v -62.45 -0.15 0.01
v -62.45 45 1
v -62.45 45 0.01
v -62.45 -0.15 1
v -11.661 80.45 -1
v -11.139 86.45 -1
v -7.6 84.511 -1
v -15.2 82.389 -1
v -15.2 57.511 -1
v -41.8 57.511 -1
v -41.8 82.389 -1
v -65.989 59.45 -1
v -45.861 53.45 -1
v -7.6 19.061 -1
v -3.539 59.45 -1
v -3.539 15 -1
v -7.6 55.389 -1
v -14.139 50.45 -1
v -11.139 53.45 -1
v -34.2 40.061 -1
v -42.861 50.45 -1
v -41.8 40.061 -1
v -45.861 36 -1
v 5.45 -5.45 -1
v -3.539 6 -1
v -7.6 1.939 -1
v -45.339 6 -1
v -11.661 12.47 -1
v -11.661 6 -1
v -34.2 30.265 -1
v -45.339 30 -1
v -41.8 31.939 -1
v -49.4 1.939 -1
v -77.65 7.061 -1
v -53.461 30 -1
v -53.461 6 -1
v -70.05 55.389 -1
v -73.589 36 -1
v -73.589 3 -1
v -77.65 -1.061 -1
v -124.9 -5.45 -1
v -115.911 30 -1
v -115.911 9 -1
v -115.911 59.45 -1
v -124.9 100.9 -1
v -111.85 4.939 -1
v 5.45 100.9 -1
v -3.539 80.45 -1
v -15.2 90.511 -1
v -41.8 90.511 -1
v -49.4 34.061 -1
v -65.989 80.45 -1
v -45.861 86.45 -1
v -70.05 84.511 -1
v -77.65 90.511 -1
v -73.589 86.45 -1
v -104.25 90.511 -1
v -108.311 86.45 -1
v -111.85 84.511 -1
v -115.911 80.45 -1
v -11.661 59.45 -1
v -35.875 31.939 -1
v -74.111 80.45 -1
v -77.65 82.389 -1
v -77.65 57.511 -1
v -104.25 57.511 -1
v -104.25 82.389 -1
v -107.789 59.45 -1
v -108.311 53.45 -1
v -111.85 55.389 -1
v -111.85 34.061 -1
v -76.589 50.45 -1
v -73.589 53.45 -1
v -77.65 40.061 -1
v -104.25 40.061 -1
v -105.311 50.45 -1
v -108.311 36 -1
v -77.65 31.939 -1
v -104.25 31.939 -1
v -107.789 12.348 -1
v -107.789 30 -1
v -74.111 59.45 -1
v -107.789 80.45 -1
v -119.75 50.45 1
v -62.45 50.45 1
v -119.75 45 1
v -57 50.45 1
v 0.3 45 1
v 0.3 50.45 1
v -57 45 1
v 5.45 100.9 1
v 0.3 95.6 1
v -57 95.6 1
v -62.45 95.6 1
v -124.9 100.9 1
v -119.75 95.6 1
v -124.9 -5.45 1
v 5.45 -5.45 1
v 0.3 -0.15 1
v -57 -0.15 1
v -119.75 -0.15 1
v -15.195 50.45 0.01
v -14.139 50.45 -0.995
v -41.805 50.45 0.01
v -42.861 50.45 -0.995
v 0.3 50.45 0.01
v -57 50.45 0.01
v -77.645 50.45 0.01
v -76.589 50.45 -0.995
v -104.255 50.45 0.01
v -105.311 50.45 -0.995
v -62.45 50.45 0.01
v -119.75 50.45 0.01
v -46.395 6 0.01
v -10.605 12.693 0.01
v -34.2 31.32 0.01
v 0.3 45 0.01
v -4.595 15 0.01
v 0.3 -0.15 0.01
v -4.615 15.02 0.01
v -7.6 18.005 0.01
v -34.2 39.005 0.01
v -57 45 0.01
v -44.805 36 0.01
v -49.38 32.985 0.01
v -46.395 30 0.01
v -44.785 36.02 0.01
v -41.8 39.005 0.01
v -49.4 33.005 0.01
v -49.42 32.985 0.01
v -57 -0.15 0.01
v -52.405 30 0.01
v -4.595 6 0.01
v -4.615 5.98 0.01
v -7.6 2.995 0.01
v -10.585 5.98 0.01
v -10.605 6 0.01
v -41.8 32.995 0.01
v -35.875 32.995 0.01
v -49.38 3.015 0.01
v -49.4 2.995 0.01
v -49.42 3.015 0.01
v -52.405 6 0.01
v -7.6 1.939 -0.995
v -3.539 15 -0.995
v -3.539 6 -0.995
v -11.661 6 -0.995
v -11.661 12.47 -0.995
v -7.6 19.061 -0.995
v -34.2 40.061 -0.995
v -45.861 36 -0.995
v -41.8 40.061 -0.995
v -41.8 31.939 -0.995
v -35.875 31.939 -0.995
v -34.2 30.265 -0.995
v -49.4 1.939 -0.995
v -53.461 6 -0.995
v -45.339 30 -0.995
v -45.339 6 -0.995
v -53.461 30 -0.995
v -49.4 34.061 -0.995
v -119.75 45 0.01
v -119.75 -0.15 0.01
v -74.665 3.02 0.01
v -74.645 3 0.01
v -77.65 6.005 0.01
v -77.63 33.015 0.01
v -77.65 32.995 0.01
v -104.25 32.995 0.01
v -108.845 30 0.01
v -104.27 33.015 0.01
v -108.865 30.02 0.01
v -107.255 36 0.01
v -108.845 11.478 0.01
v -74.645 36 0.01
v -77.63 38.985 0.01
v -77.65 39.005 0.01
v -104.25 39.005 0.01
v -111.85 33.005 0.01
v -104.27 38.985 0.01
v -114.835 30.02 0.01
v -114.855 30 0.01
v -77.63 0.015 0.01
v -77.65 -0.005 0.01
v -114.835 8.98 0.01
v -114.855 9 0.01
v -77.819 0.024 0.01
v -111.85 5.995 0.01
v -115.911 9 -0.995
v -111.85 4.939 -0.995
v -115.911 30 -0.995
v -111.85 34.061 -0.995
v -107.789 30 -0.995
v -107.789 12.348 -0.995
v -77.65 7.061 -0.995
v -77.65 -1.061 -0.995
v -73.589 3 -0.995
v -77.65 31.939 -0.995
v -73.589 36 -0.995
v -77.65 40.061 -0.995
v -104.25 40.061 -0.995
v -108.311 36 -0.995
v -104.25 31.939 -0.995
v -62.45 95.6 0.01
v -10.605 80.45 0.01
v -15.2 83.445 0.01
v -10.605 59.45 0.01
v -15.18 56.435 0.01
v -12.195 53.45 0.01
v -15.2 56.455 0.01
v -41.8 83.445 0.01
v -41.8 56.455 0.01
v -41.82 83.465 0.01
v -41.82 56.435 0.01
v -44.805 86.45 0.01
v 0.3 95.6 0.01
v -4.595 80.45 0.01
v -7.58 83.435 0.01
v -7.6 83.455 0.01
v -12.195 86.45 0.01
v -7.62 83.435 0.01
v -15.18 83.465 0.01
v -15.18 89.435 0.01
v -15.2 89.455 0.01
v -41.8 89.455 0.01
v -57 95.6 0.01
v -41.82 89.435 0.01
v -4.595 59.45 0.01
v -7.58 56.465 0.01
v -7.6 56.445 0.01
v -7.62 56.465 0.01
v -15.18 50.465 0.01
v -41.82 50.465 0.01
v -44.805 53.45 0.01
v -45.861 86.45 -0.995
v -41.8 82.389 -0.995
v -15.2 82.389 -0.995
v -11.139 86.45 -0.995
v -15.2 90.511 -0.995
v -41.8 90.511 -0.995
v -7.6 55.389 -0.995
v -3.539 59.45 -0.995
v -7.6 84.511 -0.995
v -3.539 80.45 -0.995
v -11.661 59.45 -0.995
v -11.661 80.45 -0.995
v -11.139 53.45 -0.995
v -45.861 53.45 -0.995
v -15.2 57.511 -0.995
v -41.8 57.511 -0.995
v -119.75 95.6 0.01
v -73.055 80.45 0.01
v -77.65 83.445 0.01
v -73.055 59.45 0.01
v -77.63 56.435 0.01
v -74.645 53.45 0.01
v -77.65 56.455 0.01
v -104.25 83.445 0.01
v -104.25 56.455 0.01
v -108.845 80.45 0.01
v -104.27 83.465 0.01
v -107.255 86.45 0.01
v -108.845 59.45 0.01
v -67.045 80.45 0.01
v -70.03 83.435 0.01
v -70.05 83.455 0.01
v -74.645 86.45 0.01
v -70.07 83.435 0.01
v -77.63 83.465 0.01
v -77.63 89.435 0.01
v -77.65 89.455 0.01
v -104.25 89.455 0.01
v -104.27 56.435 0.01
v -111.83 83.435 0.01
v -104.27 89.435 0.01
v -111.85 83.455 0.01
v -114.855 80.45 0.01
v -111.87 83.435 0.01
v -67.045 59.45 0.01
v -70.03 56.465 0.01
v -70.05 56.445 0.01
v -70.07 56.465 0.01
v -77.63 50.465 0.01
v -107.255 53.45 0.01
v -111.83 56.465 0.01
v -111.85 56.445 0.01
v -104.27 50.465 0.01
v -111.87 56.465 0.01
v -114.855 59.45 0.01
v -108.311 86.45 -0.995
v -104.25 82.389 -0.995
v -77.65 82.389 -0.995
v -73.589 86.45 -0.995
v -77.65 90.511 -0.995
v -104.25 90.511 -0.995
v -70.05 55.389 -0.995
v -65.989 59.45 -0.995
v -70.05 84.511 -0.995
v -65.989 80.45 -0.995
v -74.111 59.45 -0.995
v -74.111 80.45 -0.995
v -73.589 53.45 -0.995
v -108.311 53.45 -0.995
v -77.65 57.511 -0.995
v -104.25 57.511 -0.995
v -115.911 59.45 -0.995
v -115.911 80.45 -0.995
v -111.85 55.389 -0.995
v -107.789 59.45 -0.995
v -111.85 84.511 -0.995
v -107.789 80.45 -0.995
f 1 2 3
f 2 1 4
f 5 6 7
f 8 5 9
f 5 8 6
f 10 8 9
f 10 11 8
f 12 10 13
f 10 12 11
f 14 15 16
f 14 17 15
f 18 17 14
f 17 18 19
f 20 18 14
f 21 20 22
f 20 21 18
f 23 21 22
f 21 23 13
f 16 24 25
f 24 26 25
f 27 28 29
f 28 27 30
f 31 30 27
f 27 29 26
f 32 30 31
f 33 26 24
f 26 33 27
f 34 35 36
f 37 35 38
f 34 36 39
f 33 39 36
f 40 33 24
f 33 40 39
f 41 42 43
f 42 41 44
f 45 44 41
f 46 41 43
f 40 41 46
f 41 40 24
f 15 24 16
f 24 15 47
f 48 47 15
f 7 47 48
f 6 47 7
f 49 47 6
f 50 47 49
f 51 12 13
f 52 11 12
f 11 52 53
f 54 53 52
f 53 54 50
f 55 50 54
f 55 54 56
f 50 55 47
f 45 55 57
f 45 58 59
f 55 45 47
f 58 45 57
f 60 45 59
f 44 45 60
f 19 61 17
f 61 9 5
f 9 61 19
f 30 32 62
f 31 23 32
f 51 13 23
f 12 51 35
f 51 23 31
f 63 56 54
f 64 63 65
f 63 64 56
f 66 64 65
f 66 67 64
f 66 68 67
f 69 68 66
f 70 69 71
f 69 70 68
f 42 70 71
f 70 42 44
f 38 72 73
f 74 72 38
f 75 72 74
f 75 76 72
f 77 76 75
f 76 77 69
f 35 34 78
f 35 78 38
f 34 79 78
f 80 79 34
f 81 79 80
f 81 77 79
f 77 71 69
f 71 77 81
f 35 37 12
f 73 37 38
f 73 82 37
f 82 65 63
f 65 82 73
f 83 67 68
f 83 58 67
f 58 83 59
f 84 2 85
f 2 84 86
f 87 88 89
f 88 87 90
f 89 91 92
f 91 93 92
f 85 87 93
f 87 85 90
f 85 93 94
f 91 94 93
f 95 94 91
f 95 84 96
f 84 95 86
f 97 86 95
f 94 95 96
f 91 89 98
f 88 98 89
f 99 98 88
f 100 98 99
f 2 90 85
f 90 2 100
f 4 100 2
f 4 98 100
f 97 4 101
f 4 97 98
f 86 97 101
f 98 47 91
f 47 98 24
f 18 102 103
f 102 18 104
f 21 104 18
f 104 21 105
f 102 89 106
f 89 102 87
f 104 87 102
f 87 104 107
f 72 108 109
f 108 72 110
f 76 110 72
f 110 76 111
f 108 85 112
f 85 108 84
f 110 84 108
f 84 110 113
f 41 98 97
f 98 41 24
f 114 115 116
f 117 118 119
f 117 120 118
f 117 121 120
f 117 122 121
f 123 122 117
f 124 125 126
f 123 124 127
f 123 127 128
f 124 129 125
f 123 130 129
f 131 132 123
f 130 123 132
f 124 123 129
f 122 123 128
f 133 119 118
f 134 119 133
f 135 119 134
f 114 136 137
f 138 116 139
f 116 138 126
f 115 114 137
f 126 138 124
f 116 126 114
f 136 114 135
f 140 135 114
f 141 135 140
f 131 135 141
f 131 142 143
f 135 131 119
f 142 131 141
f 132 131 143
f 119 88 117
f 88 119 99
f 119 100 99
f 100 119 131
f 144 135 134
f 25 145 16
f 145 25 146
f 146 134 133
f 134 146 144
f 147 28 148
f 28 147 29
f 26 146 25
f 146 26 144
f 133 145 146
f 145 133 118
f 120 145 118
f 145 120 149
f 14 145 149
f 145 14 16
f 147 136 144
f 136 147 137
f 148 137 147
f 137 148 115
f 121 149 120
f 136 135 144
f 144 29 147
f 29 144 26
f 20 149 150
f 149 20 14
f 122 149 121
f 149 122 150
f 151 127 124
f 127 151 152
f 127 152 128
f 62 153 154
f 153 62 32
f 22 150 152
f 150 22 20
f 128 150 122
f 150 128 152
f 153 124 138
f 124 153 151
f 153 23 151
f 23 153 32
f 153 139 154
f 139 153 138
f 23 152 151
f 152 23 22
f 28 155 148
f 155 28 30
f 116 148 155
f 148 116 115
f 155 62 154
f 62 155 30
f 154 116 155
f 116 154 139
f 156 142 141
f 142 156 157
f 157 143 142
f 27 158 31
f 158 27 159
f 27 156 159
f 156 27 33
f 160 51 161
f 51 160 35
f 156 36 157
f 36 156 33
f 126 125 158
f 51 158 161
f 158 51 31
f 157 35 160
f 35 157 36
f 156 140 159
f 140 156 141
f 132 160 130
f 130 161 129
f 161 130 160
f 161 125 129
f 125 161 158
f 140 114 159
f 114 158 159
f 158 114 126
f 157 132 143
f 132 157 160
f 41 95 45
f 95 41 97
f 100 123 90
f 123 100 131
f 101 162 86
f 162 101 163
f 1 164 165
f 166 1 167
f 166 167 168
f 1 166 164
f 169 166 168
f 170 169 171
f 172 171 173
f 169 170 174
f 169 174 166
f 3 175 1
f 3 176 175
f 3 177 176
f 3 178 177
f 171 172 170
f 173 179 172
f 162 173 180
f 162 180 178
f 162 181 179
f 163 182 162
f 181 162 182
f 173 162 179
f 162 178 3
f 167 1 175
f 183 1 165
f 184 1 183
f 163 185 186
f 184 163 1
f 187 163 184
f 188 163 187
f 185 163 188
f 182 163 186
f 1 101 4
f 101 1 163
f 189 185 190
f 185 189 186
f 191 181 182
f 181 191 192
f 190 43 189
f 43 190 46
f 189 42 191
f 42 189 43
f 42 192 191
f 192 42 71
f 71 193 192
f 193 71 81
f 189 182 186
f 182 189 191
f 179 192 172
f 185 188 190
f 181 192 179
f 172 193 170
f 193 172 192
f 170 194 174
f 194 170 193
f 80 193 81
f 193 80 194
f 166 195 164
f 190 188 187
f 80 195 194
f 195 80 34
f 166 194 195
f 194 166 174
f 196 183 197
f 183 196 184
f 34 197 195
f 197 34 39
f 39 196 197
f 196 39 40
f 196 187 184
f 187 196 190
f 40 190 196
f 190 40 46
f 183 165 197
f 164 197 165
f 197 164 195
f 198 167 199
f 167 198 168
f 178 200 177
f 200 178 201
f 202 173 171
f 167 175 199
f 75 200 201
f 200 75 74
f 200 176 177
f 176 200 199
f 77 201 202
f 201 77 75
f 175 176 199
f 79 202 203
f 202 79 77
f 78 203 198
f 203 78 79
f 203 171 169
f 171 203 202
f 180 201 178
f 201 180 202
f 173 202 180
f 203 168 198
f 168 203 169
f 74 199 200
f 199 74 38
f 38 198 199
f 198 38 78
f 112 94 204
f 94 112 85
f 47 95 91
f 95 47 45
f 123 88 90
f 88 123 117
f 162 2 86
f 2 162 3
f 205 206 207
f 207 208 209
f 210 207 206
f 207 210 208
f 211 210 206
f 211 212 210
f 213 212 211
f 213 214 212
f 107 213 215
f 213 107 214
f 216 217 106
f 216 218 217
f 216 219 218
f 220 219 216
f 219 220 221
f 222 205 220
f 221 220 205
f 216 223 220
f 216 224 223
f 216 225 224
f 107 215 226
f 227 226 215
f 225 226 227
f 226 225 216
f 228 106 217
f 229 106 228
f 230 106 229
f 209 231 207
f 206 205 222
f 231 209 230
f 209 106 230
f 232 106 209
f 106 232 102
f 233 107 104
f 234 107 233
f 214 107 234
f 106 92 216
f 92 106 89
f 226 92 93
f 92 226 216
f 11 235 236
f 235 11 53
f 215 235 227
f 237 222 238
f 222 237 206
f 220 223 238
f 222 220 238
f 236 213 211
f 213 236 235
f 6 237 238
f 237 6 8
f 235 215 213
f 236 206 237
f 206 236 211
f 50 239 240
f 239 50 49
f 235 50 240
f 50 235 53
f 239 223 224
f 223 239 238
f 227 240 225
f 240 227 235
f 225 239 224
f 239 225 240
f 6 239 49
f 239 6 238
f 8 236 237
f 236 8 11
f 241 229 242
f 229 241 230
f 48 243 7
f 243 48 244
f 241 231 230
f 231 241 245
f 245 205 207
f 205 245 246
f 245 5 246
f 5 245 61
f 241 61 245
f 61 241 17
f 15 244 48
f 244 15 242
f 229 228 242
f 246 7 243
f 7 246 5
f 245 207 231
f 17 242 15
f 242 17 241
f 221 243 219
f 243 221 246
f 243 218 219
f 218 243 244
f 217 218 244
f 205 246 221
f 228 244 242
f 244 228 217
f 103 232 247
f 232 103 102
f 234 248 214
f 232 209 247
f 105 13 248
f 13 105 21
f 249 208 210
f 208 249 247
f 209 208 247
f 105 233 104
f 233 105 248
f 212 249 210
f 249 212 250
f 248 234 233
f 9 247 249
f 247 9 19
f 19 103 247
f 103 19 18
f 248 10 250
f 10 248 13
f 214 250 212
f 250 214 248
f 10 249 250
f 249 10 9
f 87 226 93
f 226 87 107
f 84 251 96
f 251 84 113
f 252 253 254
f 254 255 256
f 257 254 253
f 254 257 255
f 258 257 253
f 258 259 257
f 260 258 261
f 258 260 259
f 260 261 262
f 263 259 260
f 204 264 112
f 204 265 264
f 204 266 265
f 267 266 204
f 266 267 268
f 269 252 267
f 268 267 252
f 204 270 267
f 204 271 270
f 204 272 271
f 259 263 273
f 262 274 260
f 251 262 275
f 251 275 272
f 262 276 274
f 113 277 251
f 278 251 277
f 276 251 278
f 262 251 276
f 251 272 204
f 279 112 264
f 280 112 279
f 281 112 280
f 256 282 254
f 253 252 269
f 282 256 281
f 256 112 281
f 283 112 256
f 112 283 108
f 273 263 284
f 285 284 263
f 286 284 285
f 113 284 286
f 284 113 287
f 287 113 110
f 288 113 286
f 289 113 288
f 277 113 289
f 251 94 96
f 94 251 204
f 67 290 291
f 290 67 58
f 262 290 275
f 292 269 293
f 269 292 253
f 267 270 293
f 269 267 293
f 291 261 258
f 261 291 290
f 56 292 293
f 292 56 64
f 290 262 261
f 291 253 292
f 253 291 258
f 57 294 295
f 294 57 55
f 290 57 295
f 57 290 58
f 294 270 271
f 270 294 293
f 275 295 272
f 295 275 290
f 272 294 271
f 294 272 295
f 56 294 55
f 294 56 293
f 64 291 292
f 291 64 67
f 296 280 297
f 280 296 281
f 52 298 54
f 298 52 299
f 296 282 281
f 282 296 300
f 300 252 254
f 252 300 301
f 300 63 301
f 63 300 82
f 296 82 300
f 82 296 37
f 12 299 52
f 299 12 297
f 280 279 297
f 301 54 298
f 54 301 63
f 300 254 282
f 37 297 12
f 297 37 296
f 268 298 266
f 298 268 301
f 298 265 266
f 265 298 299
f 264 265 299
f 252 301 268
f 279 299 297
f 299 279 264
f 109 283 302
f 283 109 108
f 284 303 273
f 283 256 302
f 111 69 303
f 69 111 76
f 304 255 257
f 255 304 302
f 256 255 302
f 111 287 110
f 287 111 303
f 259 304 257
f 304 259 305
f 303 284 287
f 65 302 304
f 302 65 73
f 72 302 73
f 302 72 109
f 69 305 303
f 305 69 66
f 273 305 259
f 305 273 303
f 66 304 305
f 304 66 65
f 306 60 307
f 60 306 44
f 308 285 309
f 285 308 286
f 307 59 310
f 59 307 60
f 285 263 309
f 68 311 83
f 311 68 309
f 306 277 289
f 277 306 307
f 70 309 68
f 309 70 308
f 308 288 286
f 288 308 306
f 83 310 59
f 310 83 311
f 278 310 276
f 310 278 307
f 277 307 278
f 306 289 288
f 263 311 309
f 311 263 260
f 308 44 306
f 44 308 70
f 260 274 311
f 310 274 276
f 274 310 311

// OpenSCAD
use <all.scad>

CUBE_WIDTH                   = 57;
CUBE_HEIGHT                  = 45;

THICKNESS                    =  1.2;

ATOM = 0.01;
dy = CUBE_HEIGHT / CUBE_WIDTH * sqrt(2)/2;

T = [
      [
        [ [02, 02], [02, 05], [09, 12], [11, 12] ],
        [ [02, 05-dy], [09, 12-dy] ],
        [ [13, 10], [13, 02] ]
      ],
      [
        [ [04, 12], [11, 12] ],
        [ [13, 10], [13, 03], [03+1, 01] ]
      ],
      [ [ [11, 12], [04, 12] ],
        [ [02, 10], [02, 03] ],
        [ [04, 01], [11, 01] ]
      ],
      [ [ [11, 12], [04,12] ],
        [ [02, 10], [02, 03] ],
        [ [04, 01], [11, 01] ],
        [ [13, 03], [13, 10] ]
      ]
    ];

B = [
      [
        [ [13, -01], [13, -10] ]
      ],
      [
        [ [02, -01], [02, -08] ],
        [ [04, -10], [11, -10] ],
        [ [13, -08], [13, -03] ]
      ],
      [
        [ [04, -10], [11, -10] ],
        [ [13, -08], [13, -01] ]
      ],
      [
        [ [04-1, -01], [11, -01] ],
        [ [13, -03], [13, -10] ]
      ]
];

D = [
      [0, 1], // 0
      [0, 0], // 1
      [1, 1], // 2
      [1, 2], // 3
      [0, 3], // 4
      [2, 2], // 5
      [2, 1], // 6
      [1, 0], // 7
      [3, 1], // 8
      [3, 2], // 9

      [],
      [0, 2],
      [1, 3],
      [2, 0],
      [2, 3],
      [3, 0],
      [3, 3],

];

module vertex(th=THICKNESS, grow=0) {
    d = sqrt(2);
    rotate([0, 0, 45]) {
        if (grow==0) {
            translate([-d/2, -d/2, 0])
            cube([d, d, th]);
        }
        else {
            cube([d, d, ATOM], center=true);

            translate([0, 0, th-ATOM])
            cube([d+grow/2, d+grow/2, ATOM], center=true);
        }
    }
}

module draw_segs(segs, th=THICKNESS, grow=0) {
    k = CUBE_HEIGHT / 15;
    scale([k, k, 1])
    for (i=[1:len(segs)-1]) {
        from = segs[i-1];
        to = segs[i];
        echo(from, to);

        hull() {
            kx = CUBE_WIDTH / CUBE_HEIGHT;
            x0 = from[0] * kx;
            y0 = from[1];
            translate([x0, y0, 0])
            vertex(th, grow);

            x1 = to[0] * kx;
            y1 = to[1];
            translate([x1, y1, 0])
            vertex(th, grow);
        }
    }
}

module frame() {
    border = 1.75;
    margin = .2;
    th = .8;
    c = CUBE_HEIGHT / 8;
    
    wext = CUBE_WIDTH  + border*2 + margin*2;
    hext = CUBE_HEIGHT + border*2 + margin*2;
    wint = CUBE_WIDTH  + margin*2;
    hint = CUBE_HEIGHT + margin*2;

    // frame
    difference() {
        translate([-border-margin, -border-margin, 0])
        cube([wext, hext, th]);

        translate([-margin, -margin, -th/2])
        cube([wint, hint, th*2]);

        translate([-margin+c, -margin-.5, -th/2])
        cube([wint-c*2, hint+.5*2, th*2]);
    }
    
    // bars
    g = .7;
    dy = CUBE_HEIGHT/3;
    for (y=[dy, dy*2])
        translate([-border, y - g/2, .4])
        cube([CUBE_WIDTH+border*2, g, .3]);

    dx = CUBE_WIDTH/3;
    for (x=[dx, dx*2])
        translate([x - g/2, -border, .4])
        cube([g, CUBE_HEIGHT+border*2, .3]);
}

module upper(index, th=THICKNESS, grow=0) {
    for (segs=T[index]) {
        draw_segs(segs, th, grow);
    }
}

module lower(index, th=THICKNESS, grow=0) {
    for (segs=B[index]) {
        draw_segs(segs, th, grow);
    }
}

module all_parts() {
    for (i=[0:3])
        translate([CUBE_WIDTH*i, 3, 0])
        upper(i);

    for (i=[0:3])
        translate([CUBE_WIDTH*i, -3, 0])
        lower(i);
}

module stencile(upper) {
    tol_x = .15 *4;
    tol_y = .15 *2;
    th = .5*2;
    border = 5 + (tol_x + tol_y)/2;

    rotate([0, 180, 0])
    for (i=[0:3]) {
        x = (i%2) * (CUBE_WIDTH + border);
        y = floor(i/2) * (CUBE_HEIGHT + border);
        translate([x, y , 0])
        scale([1, 1, 1])
        difference() {
            union() {
                difference() {
                    translate([-border, -border, -1])
                    cube([CUBE_WIDTH+border*2, CUBE_HEIGHT+border*2, 2]);
                    
                    translate([0, 0, -th -ATOM-2])
                    translate([-tol_x/2, -tol_y/2, 0])
                    cube([CUBE_WIDTH+tol_x, CUBE_HEIGHT+tol_y, 3]);
                }                
            }

            //%translate([0,0,-5]) cube([CUBE_WIDTH, CUBE_HEIGHT, 20]);
            translate([0, 0, 1-th -ATOM])
            if (upper)
                upper(i, th + ATOM*2, th);
            else
               translate([0, CUBE_HEIGHT, 0])
               lower(i, th + ATOM*2, th);
        }
    }
}

module all_faces_upper() {
    stencile(true);
}

module all_faces_lower() {
    stencile(false);
}

module digit(i) {
    d = D[i];
    if (len(d)) {
        upper(d[0]);
        
        //translate([0, -1, 0])
        lower(d[1]);
    }
}

module all_digits() {
    for (i=[0:len(D)-1]) {
        dx = (sqrt(2)-1) * CUBE_WIDTH / 2;
        translate([(CUBE_WIDTH + dx)*i, CUBE_WIDTH, 0])
        digit(i);
    }
}

////////////////////////////////////////////////////////////////////////////////////////

//!all_parts();
!all_faces_upper();
//!all_faces_lower();
//!all_digits();
